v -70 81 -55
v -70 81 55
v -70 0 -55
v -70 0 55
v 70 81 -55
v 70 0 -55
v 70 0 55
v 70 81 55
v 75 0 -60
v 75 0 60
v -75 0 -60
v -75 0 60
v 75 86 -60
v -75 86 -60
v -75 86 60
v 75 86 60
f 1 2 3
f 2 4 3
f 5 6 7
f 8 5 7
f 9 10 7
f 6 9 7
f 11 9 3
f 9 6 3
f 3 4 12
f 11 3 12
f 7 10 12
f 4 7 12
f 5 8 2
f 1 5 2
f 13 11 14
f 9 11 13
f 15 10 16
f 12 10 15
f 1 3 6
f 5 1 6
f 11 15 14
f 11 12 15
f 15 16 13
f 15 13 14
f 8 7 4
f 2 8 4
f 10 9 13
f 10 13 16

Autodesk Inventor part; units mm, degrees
ref_plane "YZ Plane" through (0, 0, 0) normal (1, 0, 0) x (0, 1, 0)
ref_plane "XZ Plane" through (0, 0, 0) normal (0, 1, 0) x (-1, 0, 0)
ref_plane "XY Plane" through (0, 0, 0) normal (0, 0, 1) x (1, 0, 0)
sketch "Sketch1" plane through (0, 0, 0) normal (0, 1, 0) x (-1, 0, 0)
  line L0 (-75, 60) -> (75, 60)
  line L1 (75, 60) -> (75, -60)
  line L2 (75, -60) -> (-75, -60)
  line L3 (-75, -60) -> (-75, 60)
  line L4 (-75, 60) -> (75, -60) construction
  line L5 (75, 60) -> (-75, -60) construction
  line L6 (-70, 55) -> (70, 55)
  line L7 (70, 55) -> (70, -55)
  line L8 (70, -55) -> (-70, -55)
  line L9 (-70, -55) -> (-70, 55)
  line L10 (-70, 55) -> (70, -55) construction
  line L11 (70, 55) -> (-70, -55) construction
  point P0 (0, 0)
  dimension "d0" = 150
  dimension "d1" = 120
  dimension "d2" = 140
  dimension "d3" = 110
  dimension "d8" = 5
extrude "Extrusion1" add sketch "Sketch1" along normal blind 86 contours L0 L1 L2 L3 | L6 L7 L8 L9
extrude "Extrusion2" cut sketch "Sketch1" along normal blind 81 contours L6 L7 L8 L9
properties part number "Stand of Shooting"
